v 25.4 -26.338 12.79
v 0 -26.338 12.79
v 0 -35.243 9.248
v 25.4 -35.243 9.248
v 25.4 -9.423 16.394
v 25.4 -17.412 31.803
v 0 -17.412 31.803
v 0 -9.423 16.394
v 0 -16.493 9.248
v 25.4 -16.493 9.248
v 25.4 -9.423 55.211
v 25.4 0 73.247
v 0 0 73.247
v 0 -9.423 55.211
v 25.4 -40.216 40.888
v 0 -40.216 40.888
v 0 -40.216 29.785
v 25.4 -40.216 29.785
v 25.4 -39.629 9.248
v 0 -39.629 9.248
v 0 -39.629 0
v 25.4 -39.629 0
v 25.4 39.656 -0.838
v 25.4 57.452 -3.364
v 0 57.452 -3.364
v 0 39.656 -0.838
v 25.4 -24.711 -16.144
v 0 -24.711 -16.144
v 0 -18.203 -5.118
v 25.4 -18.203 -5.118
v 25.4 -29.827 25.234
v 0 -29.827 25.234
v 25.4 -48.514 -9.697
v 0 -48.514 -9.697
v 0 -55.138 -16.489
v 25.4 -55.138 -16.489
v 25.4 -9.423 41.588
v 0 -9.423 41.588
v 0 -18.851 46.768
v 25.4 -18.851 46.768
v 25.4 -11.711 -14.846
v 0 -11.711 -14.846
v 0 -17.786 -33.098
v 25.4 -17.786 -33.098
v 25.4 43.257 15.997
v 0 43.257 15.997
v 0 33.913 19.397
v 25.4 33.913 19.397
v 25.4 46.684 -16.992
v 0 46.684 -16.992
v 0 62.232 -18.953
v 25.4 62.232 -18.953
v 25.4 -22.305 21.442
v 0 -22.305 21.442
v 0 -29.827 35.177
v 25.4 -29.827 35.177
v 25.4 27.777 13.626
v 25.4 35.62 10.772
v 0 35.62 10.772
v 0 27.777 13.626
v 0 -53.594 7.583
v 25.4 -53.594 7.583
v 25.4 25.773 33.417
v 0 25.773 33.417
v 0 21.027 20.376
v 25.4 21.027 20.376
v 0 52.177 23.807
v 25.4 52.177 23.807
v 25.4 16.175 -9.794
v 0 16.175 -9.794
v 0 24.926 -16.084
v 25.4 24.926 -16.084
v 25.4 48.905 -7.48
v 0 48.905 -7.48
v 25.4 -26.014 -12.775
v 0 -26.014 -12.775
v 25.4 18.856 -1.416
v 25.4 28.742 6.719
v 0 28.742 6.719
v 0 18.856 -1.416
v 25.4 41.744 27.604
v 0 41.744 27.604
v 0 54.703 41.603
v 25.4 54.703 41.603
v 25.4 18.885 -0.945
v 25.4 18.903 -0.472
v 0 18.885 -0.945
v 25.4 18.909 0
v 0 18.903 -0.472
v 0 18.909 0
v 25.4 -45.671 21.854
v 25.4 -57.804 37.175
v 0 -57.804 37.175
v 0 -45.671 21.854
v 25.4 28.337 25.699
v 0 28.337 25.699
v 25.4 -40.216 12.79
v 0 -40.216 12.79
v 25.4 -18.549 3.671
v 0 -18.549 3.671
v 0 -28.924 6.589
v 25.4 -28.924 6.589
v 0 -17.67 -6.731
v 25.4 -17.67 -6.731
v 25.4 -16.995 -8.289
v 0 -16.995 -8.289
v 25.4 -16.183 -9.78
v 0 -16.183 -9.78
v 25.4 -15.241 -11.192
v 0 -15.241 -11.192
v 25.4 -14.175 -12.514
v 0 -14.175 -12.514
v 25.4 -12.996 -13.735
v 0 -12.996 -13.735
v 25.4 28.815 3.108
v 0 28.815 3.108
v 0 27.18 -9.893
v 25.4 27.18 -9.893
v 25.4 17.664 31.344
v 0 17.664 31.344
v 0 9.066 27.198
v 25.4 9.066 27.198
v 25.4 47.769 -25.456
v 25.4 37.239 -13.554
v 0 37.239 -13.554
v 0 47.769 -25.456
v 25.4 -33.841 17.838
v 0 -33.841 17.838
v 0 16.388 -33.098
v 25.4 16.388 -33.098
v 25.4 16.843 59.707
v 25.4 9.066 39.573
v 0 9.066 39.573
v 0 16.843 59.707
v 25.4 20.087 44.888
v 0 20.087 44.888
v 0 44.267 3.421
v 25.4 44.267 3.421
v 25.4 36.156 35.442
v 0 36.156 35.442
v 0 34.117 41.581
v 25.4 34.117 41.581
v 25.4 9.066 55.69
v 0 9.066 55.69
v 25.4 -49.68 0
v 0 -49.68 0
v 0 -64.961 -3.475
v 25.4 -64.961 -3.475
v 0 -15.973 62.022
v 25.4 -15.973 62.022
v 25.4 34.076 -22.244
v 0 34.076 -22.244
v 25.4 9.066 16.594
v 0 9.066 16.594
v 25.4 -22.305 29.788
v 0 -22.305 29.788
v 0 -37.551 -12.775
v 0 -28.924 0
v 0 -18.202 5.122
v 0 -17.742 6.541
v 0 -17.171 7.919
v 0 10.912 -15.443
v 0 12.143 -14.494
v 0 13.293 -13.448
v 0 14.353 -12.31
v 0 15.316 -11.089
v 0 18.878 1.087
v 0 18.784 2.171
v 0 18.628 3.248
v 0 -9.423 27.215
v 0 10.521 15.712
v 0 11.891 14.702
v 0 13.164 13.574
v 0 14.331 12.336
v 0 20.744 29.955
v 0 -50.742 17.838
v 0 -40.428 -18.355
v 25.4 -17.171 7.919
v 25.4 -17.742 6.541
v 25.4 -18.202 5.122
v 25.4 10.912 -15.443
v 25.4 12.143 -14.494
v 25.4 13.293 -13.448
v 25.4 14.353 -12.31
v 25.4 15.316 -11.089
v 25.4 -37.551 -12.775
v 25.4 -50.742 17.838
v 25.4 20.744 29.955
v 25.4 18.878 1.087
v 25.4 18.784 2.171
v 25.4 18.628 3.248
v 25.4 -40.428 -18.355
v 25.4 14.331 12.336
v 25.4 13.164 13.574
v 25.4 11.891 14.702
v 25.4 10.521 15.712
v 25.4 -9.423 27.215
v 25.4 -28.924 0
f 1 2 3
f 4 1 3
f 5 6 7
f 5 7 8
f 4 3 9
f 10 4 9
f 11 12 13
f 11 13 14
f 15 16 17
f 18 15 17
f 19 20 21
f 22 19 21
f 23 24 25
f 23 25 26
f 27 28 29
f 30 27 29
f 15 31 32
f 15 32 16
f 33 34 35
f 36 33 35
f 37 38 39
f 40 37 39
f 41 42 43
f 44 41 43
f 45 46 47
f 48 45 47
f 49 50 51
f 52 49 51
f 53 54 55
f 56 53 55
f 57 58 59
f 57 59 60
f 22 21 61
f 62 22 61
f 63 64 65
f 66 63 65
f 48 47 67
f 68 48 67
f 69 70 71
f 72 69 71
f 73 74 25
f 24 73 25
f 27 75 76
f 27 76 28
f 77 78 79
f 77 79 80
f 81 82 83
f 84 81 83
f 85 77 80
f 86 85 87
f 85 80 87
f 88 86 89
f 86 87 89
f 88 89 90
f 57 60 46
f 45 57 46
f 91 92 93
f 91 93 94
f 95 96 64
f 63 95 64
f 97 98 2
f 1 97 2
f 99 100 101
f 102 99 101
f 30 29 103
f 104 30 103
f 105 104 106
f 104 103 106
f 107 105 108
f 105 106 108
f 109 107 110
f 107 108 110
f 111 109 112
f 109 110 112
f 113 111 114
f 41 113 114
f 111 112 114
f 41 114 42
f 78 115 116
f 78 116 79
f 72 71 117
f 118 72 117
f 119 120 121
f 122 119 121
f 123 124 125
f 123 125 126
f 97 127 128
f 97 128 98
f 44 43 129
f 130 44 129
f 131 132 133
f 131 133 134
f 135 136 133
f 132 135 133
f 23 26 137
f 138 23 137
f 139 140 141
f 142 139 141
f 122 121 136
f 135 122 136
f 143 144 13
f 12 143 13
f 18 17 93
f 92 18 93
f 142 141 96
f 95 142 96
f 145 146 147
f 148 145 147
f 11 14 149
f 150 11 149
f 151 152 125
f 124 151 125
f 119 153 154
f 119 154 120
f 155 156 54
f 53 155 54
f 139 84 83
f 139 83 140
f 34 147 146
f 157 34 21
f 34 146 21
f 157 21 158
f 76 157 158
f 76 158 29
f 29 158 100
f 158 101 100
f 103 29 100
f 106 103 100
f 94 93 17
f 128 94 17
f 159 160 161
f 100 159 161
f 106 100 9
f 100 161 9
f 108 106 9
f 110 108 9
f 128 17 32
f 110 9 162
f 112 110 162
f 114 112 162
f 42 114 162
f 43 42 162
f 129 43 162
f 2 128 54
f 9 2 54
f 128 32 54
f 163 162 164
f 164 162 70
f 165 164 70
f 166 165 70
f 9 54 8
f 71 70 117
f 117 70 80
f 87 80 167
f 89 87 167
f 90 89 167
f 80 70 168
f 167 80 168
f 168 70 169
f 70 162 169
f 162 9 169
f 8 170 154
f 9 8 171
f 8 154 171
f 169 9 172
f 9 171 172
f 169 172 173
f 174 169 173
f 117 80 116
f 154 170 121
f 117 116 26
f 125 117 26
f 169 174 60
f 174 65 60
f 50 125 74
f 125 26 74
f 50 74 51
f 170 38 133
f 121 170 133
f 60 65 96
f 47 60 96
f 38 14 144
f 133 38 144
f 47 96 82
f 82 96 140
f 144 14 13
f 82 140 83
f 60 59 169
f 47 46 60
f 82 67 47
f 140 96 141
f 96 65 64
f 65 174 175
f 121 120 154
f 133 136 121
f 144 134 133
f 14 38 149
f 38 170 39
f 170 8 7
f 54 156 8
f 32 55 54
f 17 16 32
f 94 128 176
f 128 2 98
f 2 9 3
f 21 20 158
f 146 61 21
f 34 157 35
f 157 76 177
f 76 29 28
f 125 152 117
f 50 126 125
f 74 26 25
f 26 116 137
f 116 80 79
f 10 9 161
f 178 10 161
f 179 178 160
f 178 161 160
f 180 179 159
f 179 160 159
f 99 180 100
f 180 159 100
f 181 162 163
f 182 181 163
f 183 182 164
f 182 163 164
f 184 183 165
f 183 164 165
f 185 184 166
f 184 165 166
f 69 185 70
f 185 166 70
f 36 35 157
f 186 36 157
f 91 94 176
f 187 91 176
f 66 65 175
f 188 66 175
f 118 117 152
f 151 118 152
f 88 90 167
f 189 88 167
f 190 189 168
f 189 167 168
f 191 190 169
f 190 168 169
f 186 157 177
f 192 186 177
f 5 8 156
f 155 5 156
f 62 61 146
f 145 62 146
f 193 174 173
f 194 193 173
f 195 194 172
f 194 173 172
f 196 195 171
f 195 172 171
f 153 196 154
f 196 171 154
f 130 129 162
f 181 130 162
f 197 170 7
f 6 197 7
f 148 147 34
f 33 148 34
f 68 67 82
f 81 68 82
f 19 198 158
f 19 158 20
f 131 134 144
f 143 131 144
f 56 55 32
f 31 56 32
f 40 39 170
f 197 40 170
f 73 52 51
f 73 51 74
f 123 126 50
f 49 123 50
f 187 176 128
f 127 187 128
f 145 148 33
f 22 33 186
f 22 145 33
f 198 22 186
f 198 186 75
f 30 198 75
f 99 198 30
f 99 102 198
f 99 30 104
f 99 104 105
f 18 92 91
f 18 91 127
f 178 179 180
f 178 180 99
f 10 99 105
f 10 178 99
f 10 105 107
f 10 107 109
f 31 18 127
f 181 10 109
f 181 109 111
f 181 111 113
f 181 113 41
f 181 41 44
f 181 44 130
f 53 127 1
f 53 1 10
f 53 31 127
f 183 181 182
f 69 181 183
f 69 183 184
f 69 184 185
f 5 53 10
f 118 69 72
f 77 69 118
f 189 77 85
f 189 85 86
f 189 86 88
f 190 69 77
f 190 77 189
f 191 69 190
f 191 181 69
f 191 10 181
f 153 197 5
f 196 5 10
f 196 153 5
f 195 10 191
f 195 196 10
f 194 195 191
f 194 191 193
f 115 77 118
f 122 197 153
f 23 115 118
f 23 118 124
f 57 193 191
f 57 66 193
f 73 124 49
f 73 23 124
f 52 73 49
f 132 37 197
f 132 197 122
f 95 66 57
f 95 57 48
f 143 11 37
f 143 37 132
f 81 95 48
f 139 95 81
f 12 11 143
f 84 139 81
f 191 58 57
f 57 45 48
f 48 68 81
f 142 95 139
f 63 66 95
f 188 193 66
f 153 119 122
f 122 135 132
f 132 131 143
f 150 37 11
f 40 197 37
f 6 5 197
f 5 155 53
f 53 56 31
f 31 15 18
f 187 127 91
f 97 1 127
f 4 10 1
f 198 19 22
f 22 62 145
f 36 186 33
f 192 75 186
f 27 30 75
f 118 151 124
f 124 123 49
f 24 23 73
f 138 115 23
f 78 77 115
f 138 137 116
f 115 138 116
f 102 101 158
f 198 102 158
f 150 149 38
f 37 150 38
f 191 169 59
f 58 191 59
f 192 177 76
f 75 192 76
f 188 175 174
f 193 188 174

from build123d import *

# Parameters (mm, degrees)
F1_DEPTH = 25.4


with BuildPart() as f1:
    # F0 (on Right) → F1 (new body)
    with BuildSketch(Plane.YZ):
        with BuildLine():
            ThreePointArc((18.855748, -1.416255), (18.895578, -0.708625), (18.908861, 0))
            ThreePointArc((18.908861, 0), (18.838486, 1.629863), (18.627886, 3.247594))
            ThreePointArc((18.627886, 3.247594), (17.094445, 8.082386), (14.330997, 12.335621))
            ThreePointArc((14.330997, 12.335621), (11.890608, 14.702328), (9.065882, 16.593818))
            ThreePointArc((9.065882, 16.593818), (-0.204608, 18.907754), (-9.422852, 16.393745))
            ThreePointArc((-9.422852, 16.393745), (-13.441603, 13.299185), (-16.493181, 9.247701))
            ThreePointArc((-16.493181, 9.247701), (-17.741605, 6.540678), (-18.549073, 3.67109))
            ThreePointArc((-18.549073, 3.67109), (-18.89422, -0.743959), (-18.202995, -5.118202))
            ThreePointArc((-18.202995, -5.118202), (-15.727938, -10.496522), (-11.710979, -14.845807))
            ThreePointArc((-11.710979, -14.845807), (-0.498769, -18.902281), (10.911764, -15.442746))
            ThreePointArc((10.911764, -15.442746), (13.834686, -12.889782), (16.17484, -9.793853))
            ThreePointArc((16.17484, -9.793853), (18.009208, -5.763111), (18.855748, -1.416255))
        make_face()
        with BuildLine():
            ThreePointArc((14.330997, 12.335621), (17.094445, 8.082386), (18.627886, 3.247594))
            Line((18.627886, 3.247594), (35.620206, 10.771734))
            Line((35.620206, 10.771734), (27.777187, 13.626359))
            Line((27.777187, 13.626359), (43.256562, 15.996829))
            Line((43.256562, 15.996829), (33.913499, 19.397426))
            Line((33.913499, 19.397426), (52.177158, 23.806515))
            Line((52.177158, 23.806515), (41.743724, 27.603975))
            Line((41.743724, 27.603975), (54.702936, 41.603265))
            Line((54.702936, 41.603265), (36.156493, 35.442327))
            Line((36.156493, 35.442327), (34.117385, 41.580712))
            Line((34.117385, 41.580712), (28.336922, 25.699019))
            Line((28.336922, 25.699019), (25.773159, 33.416785))
            Line((25.773159, 33.416785), (21.026523, 20.375509))
            Line((21.026523, 20.375509), (20.743884, 29.954885))
            Line((20.743884, 29.954885), (14.330997, 12.335621))
        make_face()
        with BuildLine():
            Line((28.741808, 6.718539), (18.855748, -1.416255))
            ThreePointArc((18.855748, -1.416255), (18.009208, -5.763111), (16.17484, -9.793853))
            Line((16.17484, -9.793853), (24.926406, -16.084017))
            Line((24.926406, -16.084017), (27.179874, -9.892665))
            Line((27.179874, -9.892665), (34.0759, -22.243811))
            Line((34.0759, -22.243811), (37.2388, -13.553815))
            Line((37.2388, -13.553815), (47.768776, -25.455565))
            Line((47.768776, -25.455565), (46.683991, -16.991583))
            Line((46.683991, -16.991583), (62.231524, -18.952553))
            Line((62.231524, -18.952553), (48.904825, -7.480339))
            Line((48.904825, -7.480339), (57.452464, -3.363933))
            Line((57.452464, -3.363933), (39.655712, -0.83815))
            Line((39.655712, -0.83815), (44.267129, 3.420753))
            Line((44.267129, 3.420753), (28.815001, 3.107546))
            Line((28.815001, 3.107546), (28.741808, 6.718539))
        make_face()
        with BuildLine():
            ThreePointArc((-9.422852, 16.393745), (-0.204608, 18.907754), (9.065882, 16.593818))
            Line((9.065882, 16.593818), (17.664263, 31.343678))
            Line((17.664263, 31.343678), (9.065882, 27.197644))
            Line((9.065882, 27.197644), (20.08703, 44.887555))
            Line((20.08703, 44.887555), (9.065882, 39.573293))
            Line((9.065882, 39.573293), (16.843367, 59.706657))
            Line((16.843367, 59.706657), (9.065882, 55.690415))
            Line((9.065882, 55.690415), (0, 73.246568))
            Line((0, 73.246568), (-9.422852, 55.211404))
            Line((-9.422852, 55.211404), (-15.973218, 62.022142))
            Line((-15.973218, 62.022142), (-9.422852, 41.58793))
            Line((-9.422852, 41.58793), (-18.851278, 46.768438))
            Line((-18.851278, 46.768438), (-9.422852, 27.215003))
            Line((-9.422852, 27.215003), (-17.412247, 31.802535))
            Line((-17.412247, 31.802535), (-9.422852, 16.393745))
        make_face()
        with BuildLine():
            Line((16.388254, -33.097774), (10.911764, -15.442746))
            ThreePointArc((10.911764, -15.442746), (-0.498769, -18.902281), (-11.710979, -14.845807))
            Line((-11.710979, -14.845807), (-17.786112, -33.097774))
            Line((-17.786112, -33.097774), (16.388254, -33.097774))
        make_face()
        with BuildLine():
            ThreePointArc((-16.493181, 9.247701), (-13.441603, 13.299185), (-9.422852, 16.393745))
            Line((-9.422852, 16.393745), (-22.304947, 29.787894))
            Line((-22.304947, 29.787894), (-22.304947, 21.441529))
            Line((-22.304947, 21.441529), (-29.826717, 35.176635))
            Line((-29.826717, 35.176635), (-29.826717, 25.233954))
            Line((-29.826717, 25.233954), (-40.216446, 40.888183))
            Line((-40.216446, 40.888183), (-40.216446, 29.785154))
            Line((-40.216446, 29.785154), (-57.803787, 37.174791))
            Line((-57.803787, 37.174791), (-45.671143, 21.854))
            Line((-45.671143, 21.854), (-50.741921, 17.838414))
            Line((-50.741921, 17.838414), (-33.840977, 17.838414))
            Line((-33.840977, 17.838414), (-40.216446, 12.789634))
            Line((-40.216446, 12.789634), (-26.33821, 12.789634))
            Line((-26.33821, 12.789634), (-35.24321, 9.247701))
            Line((-35.24321, 9.247701), (-16.493181, 9.247701))
        make_face()
        with BuildLine():
            Line((-24.710589, -16.143639), (-18.202995, -5.118202))
            ThreePointArc((-18.202995, -5.118202), (-18.89422, -0.743959), (-18.549073, 3.67109))
            Line((-18.549073, 3.67109), (-28.924217, 6.588699))
            Line((-28.924217, 6.588699), (-28.924217, 0))
            Line((-28.924217, 0), (-39.628703, 9.247701))
            Line((-39.628703, 9.247701), (-39.628703, 0))
            Line((-39.628703, 0), (-53.594282, 7.582523))
            Line((-53.594282, 7.582523), (-49.680065, 0))
            Line((-49.680065, 0), (-64.960659, -3.474861))
            Line((-64.960659, -3.474861), (-48.51393, -9.697216))
            Line((-48.51393, -9.697216), (-55.138189, -16.488837))
            Line((-55.138189, -16.488837), (-37.550844, -12.775449))
            Line((-37.550844, -12.775449), (-40.427528, -18.354706))
            Line((-40.427528, -18.354706), (-26.014401, -12.775449))
            Line((-26.014401, -12.775449), (-24.710589, -16.143639))
        make_face()
    extrude(amount=F1_DEPTH)


solid = f1.part
